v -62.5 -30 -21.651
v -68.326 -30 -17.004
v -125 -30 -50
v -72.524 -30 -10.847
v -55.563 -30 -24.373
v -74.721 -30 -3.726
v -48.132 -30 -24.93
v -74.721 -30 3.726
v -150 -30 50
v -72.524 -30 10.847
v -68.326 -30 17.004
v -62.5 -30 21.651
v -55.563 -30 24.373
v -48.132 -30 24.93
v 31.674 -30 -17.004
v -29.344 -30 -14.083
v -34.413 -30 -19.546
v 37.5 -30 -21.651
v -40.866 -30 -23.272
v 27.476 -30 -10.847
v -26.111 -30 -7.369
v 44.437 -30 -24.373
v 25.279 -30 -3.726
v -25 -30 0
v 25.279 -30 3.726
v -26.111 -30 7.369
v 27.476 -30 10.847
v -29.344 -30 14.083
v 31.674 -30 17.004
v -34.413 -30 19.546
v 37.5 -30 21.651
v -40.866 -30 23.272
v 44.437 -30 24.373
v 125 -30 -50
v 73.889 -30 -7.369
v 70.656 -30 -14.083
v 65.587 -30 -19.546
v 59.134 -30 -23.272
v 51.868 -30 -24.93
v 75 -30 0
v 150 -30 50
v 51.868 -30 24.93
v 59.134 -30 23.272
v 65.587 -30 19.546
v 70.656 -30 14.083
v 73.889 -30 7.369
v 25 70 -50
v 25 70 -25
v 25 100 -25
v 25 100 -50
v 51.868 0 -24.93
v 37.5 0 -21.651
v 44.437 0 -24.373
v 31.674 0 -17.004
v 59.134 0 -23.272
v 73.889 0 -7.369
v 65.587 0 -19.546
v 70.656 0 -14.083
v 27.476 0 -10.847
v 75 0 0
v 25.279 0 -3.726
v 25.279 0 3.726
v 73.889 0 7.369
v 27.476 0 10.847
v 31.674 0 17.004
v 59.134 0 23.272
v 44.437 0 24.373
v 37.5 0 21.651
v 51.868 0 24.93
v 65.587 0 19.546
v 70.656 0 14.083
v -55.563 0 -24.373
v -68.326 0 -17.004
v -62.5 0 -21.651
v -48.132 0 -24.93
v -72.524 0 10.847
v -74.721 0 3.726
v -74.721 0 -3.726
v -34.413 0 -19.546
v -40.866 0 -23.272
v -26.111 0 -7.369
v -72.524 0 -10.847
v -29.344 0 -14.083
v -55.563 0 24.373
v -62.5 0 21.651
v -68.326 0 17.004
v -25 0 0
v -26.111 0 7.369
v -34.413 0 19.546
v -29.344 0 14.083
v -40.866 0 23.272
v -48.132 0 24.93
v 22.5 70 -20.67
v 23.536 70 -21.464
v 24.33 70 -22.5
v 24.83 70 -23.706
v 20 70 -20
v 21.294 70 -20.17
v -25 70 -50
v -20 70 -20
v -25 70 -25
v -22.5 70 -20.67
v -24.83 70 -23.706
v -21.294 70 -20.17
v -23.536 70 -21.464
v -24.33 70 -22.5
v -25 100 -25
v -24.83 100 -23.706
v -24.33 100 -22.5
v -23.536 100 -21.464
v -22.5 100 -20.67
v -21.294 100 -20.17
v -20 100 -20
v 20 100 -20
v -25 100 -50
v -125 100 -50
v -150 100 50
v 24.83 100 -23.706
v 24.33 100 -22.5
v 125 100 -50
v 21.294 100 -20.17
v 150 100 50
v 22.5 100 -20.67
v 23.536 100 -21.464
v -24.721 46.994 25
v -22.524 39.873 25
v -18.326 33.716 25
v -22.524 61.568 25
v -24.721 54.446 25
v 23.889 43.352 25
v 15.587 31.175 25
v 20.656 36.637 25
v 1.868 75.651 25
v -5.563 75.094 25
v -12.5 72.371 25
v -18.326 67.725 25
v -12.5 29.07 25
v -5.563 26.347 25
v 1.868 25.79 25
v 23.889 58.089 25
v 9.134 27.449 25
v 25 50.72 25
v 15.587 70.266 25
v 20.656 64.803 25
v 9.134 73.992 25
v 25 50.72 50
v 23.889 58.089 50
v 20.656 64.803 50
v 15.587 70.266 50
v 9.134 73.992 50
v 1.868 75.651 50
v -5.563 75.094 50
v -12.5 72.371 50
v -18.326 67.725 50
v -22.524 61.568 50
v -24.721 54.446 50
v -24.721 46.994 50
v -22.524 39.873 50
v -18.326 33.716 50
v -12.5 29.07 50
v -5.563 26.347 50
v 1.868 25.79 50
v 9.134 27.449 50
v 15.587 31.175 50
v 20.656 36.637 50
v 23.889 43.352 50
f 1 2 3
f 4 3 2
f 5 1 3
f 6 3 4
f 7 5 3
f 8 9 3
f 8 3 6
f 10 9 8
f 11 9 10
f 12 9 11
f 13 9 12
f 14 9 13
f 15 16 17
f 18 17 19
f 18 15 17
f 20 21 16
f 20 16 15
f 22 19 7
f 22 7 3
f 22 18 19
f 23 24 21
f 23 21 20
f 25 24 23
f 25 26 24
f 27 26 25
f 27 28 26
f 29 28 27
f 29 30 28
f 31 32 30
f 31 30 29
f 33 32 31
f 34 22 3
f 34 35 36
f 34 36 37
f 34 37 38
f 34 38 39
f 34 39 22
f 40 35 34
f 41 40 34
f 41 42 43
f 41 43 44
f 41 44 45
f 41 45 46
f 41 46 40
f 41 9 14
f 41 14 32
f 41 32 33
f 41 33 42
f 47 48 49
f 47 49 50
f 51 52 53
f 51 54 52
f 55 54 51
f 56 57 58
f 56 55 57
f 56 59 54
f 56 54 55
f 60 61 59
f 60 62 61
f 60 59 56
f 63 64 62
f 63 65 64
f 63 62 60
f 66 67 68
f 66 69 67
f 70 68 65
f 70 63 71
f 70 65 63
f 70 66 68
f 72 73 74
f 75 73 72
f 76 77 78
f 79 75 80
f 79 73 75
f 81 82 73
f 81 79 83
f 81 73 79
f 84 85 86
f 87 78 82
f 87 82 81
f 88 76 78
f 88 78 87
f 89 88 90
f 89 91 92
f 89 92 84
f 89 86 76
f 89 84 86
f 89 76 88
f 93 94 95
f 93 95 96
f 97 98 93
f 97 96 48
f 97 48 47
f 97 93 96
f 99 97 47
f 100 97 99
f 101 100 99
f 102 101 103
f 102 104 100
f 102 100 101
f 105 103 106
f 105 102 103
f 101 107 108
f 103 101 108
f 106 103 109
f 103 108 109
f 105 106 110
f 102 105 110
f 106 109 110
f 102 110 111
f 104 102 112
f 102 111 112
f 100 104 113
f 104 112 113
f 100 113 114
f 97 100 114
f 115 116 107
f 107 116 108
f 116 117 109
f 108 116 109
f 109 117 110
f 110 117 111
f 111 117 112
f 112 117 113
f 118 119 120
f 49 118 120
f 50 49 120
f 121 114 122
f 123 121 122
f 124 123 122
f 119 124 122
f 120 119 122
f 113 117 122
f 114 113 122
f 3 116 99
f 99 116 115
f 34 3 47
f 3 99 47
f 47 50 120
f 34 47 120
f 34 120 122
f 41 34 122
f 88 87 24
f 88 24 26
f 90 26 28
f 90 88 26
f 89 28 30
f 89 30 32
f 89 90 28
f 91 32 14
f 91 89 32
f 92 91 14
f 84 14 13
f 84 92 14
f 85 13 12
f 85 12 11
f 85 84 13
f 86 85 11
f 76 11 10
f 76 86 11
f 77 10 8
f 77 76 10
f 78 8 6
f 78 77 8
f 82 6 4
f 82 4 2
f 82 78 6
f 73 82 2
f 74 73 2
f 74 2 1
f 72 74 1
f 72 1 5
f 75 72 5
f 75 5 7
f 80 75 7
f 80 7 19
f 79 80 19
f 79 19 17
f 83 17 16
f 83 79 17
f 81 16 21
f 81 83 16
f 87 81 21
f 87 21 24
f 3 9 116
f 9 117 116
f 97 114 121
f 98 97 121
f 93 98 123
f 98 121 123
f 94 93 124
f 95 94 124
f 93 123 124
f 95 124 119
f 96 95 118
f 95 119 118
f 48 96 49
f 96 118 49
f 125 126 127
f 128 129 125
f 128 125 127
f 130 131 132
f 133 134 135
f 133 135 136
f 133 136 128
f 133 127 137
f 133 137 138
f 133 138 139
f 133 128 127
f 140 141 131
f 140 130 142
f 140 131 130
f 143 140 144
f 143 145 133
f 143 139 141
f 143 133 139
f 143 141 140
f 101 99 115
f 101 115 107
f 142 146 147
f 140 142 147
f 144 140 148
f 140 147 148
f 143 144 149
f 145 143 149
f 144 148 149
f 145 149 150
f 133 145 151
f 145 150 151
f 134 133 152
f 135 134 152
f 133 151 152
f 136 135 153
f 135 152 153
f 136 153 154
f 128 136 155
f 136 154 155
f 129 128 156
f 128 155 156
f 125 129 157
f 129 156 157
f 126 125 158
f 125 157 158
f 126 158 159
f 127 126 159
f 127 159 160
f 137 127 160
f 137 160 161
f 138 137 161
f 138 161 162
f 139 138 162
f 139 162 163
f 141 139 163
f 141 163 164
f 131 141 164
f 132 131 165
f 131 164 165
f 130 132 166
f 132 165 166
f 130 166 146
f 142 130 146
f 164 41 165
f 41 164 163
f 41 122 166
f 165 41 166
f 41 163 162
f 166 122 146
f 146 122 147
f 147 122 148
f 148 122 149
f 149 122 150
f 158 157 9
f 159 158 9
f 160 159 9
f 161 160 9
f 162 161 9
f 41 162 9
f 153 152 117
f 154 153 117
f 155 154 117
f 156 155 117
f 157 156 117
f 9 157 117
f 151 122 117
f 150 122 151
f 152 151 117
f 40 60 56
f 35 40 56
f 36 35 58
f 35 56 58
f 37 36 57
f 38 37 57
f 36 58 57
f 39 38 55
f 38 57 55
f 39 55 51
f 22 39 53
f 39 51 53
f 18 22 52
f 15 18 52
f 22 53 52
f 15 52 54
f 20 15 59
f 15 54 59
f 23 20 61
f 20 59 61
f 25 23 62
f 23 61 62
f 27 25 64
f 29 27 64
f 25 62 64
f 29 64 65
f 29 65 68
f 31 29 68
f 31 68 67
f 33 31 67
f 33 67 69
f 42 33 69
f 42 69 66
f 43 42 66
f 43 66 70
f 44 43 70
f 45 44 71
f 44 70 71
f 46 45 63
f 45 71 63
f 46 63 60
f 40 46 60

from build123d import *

# Parameters (mm, degrees)
F1_DEPTH = 100
F2_R     = 25
F3_DEPTH = 30
F4_R     = 25
F5_DEPTH = 25
F7_DEPTH = 30


with BuildPart() as f1:
    # F0 (on Front) → F1 (new body)
    with BuildSketch(Plane.XZ):
        Polygon((125, 50), (-125, 50), (-150, 50), (-125, -50), (125, -50), (150, 50), align=None)
    extrude(amount=-F1_DEPTH)

    # F2 (on face) → F3 (join)
    with BuildSketch(Plane.XZ):
        Polygon((125, -50), (150, 50), (-150, 50), (-125, -50), align=None)
        with Locations((-50, 0)):
            Circle(F2_R, mode=Mode.SUBTRACT)
        with BuildLine():
            ThreePointArc((25, 0), (50, 25), (75, 0))
            ThreePointArc((75, 0), (50, -25), (25, 0))
        make_face(mode=Mode.SUBTRACT)
    extrude(amount=F3_DEPTH)

    # F4 (on face) → F5 (cut)
    with BuildSketch(Plane.XY.offset(50)):
        with Locations((0, 50.720426)):
            Circle(F4_R)
    extrude(amount=-F5_DEPTH, mode=Mode.SUBTRACT)

    # F6 (on face) → F7 (cut)
    with BuildSketch(Plane(origin=(0, 100, 0), x_dir=(-1, 0, 0), z_dir=(0, 1, 0))):
        with BuildLine():
            Line((-25, -50), (0, -50))
            Line((0, -50), (25, -50))
            Line((25, -50), (25, -25))
            ThreePointArc((25, -25), (23.535534, -21.464466), (20, -20))
            Line((20, -20), (-20, -20))
            ThreePointArc((-20, -20), (-23.535534, -21.464466), (-25, -25))
            Line((-25, -25), (-25, -50))
        make_face()
    extrude(amount=-F7_DEPTH, mode=Mode.SUBTRACT)


solid = f1.part
